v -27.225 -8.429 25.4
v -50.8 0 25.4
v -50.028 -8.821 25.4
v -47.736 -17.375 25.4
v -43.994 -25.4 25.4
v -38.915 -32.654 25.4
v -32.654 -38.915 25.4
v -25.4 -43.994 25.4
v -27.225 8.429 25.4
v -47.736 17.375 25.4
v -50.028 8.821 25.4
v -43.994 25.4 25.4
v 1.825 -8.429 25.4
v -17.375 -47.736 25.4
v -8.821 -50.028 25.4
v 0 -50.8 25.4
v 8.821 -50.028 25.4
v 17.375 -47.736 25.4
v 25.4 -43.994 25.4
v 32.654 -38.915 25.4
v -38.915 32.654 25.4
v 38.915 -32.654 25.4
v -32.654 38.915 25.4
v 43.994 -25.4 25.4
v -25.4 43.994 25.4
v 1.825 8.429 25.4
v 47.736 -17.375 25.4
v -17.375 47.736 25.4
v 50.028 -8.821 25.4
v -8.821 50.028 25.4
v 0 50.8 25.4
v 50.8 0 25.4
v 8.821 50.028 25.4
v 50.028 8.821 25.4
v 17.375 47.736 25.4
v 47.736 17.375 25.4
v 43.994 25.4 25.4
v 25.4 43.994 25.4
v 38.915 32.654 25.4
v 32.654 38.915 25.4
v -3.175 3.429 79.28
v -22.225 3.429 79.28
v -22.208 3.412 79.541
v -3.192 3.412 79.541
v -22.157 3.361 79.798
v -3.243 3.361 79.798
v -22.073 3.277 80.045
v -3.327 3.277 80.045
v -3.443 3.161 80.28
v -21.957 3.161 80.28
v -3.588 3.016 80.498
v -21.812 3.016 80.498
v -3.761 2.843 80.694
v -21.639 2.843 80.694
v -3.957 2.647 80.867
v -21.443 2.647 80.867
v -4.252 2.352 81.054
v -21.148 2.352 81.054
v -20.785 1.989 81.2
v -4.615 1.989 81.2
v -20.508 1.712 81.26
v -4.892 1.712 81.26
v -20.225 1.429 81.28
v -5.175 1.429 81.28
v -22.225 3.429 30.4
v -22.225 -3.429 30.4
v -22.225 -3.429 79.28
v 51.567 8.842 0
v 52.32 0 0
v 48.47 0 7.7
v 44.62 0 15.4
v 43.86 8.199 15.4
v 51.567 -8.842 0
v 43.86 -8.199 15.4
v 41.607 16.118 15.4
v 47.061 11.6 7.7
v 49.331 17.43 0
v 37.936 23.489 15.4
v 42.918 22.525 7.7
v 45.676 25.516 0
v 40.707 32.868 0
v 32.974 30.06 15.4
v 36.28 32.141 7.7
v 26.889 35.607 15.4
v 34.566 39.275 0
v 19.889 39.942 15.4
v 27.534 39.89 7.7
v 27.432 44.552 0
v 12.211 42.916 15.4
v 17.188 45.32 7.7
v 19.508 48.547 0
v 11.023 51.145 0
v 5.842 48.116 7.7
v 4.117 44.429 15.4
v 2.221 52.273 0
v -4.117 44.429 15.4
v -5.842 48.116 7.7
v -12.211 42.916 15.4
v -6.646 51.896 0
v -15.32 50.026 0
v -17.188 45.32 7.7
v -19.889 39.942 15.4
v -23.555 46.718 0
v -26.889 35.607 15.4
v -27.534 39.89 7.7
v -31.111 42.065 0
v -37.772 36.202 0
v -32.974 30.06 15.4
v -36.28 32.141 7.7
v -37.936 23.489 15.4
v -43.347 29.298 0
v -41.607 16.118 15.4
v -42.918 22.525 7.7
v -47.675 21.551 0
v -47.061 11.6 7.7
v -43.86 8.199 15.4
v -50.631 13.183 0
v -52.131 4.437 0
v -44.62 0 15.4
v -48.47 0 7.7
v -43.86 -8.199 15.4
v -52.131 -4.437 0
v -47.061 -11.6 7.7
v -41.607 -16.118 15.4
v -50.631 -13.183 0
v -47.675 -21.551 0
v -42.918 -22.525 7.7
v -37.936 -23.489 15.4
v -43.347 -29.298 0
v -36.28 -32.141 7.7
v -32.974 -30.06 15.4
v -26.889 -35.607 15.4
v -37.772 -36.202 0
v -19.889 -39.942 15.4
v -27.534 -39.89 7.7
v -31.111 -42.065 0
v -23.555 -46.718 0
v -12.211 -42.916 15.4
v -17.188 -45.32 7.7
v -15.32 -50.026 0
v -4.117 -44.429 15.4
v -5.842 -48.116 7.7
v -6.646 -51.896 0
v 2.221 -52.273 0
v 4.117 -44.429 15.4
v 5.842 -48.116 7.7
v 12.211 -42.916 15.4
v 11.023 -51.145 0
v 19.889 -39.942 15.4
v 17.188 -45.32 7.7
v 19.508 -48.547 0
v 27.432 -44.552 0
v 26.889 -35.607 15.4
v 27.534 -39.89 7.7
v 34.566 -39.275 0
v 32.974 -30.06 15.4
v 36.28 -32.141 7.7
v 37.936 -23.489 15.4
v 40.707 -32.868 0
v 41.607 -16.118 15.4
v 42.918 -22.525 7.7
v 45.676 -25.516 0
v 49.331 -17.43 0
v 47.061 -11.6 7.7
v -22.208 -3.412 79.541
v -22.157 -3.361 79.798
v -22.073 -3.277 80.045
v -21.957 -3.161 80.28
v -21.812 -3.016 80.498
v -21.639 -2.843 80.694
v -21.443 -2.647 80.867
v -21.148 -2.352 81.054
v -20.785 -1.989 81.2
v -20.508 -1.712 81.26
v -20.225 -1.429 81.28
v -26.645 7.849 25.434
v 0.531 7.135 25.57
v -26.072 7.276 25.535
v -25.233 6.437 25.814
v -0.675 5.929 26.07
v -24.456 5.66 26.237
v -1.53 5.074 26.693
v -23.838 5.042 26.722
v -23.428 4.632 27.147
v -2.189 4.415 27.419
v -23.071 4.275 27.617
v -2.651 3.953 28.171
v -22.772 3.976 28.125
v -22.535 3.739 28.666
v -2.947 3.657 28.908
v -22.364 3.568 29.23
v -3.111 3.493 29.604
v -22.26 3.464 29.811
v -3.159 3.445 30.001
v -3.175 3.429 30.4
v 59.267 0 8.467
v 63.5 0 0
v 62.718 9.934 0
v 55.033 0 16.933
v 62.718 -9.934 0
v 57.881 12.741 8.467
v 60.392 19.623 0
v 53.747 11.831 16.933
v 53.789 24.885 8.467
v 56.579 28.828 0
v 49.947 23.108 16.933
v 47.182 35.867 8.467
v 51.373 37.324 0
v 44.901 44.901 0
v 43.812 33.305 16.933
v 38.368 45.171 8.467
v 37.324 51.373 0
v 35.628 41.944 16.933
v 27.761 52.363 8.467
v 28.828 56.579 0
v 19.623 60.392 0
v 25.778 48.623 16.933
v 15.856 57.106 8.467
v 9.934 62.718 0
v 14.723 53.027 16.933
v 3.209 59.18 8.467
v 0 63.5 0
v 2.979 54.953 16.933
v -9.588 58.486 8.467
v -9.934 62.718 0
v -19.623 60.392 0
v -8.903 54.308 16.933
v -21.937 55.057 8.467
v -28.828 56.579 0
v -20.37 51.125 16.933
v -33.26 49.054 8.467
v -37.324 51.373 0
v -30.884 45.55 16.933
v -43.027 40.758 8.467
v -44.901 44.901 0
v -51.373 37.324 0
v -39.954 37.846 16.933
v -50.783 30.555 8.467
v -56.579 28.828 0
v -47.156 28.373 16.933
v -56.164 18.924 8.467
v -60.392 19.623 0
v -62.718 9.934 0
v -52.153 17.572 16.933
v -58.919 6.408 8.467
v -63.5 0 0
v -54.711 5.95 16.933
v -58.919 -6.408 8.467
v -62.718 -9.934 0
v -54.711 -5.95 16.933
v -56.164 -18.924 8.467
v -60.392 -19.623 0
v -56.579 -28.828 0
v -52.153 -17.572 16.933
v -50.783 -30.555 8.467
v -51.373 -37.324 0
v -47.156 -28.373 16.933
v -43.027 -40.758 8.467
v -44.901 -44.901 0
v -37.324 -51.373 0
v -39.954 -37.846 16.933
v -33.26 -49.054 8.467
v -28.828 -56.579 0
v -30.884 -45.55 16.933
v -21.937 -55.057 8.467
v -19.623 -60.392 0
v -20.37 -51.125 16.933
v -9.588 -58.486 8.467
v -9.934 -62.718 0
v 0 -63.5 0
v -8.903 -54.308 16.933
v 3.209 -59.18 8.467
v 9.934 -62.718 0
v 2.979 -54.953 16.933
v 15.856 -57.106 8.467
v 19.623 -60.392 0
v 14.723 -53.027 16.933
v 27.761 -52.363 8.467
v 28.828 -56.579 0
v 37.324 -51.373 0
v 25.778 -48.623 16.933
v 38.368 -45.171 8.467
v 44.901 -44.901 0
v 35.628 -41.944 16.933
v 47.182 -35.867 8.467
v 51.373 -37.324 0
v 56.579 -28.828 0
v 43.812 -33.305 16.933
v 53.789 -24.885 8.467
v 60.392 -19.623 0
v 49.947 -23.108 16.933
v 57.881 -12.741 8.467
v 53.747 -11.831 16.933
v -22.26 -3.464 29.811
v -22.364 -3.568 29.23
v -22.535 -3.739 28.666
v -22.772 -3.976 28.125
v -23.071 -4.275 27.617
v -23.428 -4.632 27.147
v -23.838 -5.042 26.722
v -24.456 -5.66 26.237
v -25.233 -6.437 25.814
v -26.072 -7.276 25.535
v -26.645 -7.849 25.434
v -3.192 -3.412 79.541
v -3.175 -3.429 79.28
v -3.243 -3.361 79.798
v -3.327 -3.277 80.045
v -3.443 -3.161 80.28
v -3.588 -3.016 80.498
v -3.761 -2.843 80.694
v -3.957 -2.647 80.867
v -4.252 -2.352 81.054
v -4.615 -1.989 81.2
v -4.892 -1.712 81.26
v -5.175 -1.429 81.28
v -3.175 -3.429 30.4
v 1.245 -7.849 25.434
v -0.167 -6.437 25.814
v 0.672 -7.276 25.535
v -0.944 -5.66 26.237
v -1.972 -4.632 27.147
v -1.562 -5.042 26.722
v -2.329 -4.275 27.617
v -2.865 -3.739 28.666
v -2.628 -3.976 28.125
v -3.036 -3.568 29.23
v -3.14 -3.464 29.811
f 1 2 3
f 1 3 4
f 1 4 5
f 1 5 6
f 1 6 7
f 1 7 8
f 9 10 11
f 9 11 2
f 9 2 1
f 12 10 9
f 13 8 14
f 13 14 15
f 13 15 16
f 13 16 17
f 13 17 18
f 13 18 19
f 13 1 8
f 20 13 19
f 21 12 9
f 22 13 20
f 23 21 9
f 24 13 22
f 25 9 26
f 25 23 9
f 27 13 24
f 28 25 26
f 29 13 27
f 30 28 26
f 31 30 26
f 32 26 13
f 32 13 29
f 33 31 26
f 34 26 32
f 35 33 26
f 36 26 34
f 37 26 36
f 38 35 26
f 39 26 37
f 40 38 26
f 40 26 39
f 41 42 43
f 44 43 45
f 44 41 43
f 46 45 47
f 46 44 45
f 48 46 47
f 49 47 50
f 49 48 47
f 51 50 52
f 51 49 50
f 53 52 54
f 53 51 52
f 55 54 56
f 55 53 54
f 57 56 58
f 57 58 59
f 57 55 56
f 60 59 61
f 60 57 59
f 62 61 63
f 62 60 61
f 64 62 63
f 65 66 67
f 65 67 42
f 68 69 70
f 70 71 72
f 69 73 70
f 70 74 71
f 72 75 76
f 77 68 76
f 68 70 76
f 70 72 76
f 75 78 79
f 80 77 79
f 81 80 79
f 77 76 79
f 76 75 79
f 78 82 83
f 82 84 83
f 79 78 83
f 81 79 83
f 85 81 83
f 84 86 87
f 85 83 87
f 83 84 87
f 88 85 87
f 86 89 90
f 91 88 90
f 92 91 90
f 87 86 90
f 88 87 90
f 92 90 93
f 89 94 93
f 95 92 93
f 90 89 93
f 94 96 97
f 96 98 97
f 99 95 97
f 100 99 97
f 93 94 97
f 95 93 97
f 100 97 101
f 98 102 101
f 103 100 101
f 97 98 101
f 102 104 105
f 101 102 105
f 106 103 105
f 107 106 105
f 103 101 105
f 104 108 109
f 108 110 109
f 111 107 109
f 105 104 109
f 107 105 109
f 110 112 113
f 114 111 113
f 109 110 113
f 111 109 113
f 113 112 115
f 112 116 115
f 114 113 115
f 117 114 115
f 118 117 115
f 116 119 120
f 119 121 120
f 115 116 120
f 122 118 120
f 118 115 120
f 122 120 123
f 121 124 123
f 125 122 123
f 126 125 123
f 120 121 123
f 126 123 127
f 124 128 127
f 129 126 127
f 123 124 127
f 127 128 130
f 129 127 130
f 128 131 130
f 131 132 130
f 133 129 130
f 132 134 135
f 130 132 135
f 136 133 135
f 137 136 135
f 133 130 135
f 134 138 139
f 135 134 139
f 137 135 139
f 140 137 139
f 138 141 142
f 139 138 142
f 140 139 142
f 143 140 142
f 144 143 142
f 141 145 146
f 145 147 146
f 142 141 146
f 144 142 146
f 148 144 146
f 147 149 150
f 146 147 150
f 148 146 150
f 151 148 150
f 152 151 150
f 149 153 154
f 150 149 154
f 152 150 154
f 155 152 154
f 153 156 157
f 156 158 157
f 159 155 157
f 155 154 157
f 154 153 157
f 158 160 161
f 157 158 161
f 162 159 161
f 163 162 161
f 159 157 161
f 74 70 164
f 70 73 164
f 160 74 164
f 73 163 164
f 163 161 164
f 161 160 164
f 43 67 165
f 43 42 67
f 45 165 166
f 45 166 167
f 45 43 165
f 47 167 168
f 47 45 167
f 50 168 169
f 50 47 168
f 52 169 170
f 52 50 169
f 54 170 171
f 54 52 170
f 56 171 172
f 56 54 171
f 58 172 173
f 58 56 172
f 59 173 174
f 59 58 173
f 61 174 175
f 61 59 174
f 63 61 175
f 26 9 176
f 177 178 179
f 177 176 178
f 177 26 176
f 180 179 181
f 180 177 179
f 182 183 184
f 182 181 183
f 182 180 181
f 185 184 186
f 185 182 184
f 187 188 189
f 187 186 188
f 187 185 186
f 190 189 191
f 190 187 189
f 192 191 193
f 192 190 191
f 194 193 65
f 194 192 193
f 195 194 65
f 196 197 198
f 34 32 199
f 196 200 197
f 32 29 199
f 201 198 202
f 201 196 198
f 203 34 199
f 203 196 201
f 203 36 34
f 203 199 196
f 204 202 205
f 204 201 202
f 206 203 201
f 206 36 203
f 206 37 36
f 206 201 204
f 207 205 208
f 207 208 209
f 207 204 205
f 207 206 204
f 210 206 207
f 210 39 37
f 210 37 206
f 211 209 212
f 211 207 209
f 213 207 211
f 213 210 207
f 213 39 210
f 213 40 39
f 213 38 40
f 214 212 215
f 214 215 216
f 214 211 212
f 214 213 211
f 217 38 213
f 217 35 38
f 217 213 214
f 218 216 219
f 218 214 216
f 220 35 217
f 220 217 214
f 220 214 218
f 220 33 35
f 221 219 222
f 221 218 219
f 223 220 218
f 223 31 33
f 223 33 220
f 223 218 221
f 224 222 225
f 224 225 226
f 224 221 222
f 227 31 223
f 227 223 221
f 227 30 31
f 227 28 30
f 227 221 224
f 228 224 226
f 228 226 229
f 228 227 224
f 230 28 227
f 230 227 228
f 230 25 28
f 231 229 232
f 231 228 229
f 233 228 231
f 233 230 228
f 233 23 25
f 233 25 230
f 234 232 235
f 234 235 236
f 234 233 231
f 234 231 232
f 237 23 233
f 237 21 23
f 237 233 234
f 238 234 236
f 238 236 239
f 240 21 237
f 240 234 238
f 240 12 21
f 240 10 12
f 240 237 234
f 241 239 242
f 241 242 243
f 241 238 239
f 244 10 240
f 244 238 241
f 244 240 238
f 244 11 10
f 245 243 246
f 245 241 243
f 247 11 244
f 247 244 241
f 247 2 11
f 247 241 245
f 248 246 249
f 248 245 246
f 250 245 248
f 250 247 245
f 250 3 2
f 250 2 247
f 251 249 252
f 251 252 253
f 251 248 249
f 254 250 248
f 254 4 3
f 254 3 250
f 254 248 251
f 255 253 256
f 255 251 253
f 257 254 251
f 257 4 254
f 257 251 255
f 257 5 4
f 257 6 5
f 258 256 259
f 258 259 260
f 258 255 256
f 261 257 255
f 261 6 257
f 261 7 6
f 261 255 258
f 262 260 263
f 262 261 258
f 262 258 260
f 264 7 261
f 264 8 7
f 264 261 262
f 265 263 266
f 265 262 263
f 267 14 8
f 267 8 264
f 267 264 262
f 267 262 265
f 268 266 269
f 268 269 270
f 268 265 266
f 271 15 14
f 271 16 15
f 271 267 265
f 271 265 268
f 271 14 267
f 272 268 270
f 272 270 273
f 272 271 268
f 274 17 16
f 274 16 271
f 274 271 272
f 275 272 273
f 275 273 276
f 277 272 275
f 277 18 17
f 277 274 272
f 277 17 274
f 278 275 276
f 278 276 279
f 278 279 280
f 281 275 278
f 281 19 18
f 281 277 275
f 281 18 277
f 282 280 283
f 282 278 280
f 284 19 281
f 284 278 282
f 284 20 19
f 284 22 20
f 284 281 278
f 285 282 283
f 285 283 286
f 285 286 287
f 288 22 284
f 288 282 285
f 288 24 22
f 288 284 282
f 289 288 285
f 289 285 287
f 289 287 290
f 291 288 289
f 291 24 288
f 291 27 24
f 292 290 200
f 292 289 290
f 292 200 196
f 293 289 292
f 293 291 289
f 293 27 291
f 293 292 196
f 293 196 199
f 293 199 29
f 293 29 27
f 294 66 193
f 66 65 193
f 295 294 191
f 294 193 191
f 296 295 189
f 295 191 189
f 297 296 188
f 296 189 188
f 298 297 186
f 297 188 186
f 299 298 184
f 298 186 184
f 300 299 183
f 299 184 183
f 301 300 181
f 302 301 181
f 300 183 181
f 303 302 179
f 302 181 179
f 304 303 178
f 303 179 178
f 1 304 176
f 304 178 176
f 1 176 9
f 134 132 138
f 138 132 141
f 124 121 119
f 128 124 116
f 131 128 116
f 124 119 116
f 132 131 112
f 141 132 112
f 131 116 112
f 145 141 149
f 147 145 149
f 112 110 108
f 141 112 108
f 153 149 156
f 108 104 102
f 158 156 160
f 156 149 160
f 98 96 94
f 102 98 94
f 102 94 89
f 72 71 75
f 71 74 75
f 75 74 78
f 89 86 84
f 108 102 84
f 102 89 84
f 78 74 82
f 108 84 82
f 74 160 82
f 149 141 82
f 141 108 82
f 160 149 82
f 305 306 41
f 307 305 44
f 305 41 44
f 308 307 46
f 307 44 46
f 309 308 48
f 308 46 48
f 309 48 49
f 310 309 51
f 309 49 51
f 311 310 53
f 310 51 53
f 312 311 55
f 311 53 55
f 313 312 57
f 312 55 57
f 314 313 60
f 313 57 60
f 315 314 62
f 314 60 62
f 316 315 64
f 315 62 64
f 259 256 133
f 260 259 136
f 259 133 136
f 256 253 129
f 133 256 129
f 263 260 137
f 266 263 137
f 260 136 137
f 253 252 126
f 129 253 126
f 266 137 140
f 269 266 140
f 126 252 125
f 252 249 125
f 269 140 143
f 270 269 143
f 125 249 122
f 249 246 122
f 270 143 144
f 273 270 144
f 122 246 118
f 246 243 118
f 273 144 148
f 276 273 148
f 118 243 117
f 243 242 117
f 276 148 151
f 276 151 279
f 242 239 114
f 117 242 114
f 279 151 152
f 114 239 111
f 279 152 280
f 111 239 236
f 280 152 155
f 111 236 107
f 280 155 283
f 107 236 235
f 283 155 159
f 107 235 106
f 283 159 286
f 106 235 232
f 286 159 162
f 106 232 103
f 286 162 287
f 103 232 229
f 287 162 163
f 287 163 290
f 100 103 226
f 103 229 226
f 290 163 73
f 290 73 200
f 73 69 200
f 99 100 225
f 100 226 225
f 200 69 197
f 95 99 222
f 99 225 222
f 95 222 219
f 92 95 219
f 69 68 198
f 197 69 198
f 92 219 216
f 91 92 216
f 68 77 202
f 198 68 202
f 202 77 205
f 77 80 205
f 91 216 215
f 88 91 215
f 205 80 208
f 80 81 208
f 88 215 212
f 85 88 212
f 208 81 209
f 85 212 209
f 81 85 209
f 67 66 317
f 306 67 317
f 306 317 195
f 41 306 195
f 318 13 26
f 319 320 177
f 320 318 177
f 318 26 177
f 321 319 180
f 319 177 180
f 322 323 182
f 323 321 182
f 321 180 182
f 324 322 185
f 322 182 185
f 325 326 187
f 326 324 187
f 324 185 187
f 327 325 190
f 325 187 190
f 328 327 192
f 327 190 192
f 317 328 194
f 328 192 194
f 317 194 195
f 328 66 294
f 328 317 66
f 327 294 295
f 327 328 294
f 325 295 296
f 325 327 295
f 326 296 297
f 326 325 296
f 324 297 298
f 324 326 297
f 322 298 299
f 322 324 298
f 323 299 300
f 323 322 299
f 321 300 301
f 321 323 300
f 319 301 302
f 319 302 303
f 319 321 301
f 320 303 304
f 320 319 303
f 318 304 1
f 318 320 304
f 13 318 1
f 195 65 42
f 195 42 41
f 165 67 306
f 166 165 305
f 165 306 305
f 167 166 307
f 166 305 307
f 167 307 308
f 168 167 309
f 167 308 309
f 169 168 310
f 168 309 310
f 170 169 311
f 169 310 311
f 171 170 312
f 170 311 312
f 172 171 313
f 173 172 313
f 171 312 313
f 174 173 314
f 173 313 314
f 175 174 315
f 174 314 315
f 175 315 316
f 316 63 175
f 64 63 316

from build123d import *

# Parameters (mm, degrees)
SKETCH1_R           = 63.5
SKETCH2_R           = 50.8
SHELL1_T            = -10
SKETCH3_W           = 19.05
SKETCH3_H           = 6.858
BOSS_EXTRUDE1_DEPTH = 55.88
FILLET2_R           = 2
FILLET3_R           = 5


with BuildPart() as part:
    # Sketch1 → Loft1 section 0
    with BuildSketch(Plane.XY):
        Circle(SKETCH1_R)
    # Sketch2 → Loft1 section 1
    with BuildSketch(Plane.XY.offset(25.4)):
        Circle(SKETCH2_R)
    loft()

    # Shell1
    shell1_openings = [part.faces().sort_by_distance(p)[0] for p in [
        (0, 0, 0),
    ]]
    offset(amount=SHELL1_T, openings=shell1_openings, kind=Kind.INTERSECTION)

    # Sketch3 → Boss-Extrude1 (add)
    with BuildSketch(Plane.XY.offset(25.4)):
        with Locations((-12.7, 0)):
            Rectangle(SKETCH3_W, SKETCH3_H)
    extrude(amount=BOSS_EXTRUDE1_DEPTH)

    # Fillet2
    fillet2_edges = [part.edges().sort_by_distance(p)[0] for p in [
        (-22.225, 0, 81.28),
        (-12.7, -3.429, 81.28),
        (-3.175, 0, 81.28),
        (-12.7, 3.429, 81.28),
    ]]
    fillet(fillet2_edges, radius=FILLET2_R)

    # Fillet3
    fillet3_edges = [part.edges().sort_by_distance(p)[0] for p in [
        (-22.225, 0, 25.4),
        (-12.7, -3.429, 25.4),
        (-3.175, 0, 25.4),
        (-12.7, 3.429, 25.4),
    ]]
    fillet(fillet3_edges, radius=FILLET3_R)


solid = part.part
